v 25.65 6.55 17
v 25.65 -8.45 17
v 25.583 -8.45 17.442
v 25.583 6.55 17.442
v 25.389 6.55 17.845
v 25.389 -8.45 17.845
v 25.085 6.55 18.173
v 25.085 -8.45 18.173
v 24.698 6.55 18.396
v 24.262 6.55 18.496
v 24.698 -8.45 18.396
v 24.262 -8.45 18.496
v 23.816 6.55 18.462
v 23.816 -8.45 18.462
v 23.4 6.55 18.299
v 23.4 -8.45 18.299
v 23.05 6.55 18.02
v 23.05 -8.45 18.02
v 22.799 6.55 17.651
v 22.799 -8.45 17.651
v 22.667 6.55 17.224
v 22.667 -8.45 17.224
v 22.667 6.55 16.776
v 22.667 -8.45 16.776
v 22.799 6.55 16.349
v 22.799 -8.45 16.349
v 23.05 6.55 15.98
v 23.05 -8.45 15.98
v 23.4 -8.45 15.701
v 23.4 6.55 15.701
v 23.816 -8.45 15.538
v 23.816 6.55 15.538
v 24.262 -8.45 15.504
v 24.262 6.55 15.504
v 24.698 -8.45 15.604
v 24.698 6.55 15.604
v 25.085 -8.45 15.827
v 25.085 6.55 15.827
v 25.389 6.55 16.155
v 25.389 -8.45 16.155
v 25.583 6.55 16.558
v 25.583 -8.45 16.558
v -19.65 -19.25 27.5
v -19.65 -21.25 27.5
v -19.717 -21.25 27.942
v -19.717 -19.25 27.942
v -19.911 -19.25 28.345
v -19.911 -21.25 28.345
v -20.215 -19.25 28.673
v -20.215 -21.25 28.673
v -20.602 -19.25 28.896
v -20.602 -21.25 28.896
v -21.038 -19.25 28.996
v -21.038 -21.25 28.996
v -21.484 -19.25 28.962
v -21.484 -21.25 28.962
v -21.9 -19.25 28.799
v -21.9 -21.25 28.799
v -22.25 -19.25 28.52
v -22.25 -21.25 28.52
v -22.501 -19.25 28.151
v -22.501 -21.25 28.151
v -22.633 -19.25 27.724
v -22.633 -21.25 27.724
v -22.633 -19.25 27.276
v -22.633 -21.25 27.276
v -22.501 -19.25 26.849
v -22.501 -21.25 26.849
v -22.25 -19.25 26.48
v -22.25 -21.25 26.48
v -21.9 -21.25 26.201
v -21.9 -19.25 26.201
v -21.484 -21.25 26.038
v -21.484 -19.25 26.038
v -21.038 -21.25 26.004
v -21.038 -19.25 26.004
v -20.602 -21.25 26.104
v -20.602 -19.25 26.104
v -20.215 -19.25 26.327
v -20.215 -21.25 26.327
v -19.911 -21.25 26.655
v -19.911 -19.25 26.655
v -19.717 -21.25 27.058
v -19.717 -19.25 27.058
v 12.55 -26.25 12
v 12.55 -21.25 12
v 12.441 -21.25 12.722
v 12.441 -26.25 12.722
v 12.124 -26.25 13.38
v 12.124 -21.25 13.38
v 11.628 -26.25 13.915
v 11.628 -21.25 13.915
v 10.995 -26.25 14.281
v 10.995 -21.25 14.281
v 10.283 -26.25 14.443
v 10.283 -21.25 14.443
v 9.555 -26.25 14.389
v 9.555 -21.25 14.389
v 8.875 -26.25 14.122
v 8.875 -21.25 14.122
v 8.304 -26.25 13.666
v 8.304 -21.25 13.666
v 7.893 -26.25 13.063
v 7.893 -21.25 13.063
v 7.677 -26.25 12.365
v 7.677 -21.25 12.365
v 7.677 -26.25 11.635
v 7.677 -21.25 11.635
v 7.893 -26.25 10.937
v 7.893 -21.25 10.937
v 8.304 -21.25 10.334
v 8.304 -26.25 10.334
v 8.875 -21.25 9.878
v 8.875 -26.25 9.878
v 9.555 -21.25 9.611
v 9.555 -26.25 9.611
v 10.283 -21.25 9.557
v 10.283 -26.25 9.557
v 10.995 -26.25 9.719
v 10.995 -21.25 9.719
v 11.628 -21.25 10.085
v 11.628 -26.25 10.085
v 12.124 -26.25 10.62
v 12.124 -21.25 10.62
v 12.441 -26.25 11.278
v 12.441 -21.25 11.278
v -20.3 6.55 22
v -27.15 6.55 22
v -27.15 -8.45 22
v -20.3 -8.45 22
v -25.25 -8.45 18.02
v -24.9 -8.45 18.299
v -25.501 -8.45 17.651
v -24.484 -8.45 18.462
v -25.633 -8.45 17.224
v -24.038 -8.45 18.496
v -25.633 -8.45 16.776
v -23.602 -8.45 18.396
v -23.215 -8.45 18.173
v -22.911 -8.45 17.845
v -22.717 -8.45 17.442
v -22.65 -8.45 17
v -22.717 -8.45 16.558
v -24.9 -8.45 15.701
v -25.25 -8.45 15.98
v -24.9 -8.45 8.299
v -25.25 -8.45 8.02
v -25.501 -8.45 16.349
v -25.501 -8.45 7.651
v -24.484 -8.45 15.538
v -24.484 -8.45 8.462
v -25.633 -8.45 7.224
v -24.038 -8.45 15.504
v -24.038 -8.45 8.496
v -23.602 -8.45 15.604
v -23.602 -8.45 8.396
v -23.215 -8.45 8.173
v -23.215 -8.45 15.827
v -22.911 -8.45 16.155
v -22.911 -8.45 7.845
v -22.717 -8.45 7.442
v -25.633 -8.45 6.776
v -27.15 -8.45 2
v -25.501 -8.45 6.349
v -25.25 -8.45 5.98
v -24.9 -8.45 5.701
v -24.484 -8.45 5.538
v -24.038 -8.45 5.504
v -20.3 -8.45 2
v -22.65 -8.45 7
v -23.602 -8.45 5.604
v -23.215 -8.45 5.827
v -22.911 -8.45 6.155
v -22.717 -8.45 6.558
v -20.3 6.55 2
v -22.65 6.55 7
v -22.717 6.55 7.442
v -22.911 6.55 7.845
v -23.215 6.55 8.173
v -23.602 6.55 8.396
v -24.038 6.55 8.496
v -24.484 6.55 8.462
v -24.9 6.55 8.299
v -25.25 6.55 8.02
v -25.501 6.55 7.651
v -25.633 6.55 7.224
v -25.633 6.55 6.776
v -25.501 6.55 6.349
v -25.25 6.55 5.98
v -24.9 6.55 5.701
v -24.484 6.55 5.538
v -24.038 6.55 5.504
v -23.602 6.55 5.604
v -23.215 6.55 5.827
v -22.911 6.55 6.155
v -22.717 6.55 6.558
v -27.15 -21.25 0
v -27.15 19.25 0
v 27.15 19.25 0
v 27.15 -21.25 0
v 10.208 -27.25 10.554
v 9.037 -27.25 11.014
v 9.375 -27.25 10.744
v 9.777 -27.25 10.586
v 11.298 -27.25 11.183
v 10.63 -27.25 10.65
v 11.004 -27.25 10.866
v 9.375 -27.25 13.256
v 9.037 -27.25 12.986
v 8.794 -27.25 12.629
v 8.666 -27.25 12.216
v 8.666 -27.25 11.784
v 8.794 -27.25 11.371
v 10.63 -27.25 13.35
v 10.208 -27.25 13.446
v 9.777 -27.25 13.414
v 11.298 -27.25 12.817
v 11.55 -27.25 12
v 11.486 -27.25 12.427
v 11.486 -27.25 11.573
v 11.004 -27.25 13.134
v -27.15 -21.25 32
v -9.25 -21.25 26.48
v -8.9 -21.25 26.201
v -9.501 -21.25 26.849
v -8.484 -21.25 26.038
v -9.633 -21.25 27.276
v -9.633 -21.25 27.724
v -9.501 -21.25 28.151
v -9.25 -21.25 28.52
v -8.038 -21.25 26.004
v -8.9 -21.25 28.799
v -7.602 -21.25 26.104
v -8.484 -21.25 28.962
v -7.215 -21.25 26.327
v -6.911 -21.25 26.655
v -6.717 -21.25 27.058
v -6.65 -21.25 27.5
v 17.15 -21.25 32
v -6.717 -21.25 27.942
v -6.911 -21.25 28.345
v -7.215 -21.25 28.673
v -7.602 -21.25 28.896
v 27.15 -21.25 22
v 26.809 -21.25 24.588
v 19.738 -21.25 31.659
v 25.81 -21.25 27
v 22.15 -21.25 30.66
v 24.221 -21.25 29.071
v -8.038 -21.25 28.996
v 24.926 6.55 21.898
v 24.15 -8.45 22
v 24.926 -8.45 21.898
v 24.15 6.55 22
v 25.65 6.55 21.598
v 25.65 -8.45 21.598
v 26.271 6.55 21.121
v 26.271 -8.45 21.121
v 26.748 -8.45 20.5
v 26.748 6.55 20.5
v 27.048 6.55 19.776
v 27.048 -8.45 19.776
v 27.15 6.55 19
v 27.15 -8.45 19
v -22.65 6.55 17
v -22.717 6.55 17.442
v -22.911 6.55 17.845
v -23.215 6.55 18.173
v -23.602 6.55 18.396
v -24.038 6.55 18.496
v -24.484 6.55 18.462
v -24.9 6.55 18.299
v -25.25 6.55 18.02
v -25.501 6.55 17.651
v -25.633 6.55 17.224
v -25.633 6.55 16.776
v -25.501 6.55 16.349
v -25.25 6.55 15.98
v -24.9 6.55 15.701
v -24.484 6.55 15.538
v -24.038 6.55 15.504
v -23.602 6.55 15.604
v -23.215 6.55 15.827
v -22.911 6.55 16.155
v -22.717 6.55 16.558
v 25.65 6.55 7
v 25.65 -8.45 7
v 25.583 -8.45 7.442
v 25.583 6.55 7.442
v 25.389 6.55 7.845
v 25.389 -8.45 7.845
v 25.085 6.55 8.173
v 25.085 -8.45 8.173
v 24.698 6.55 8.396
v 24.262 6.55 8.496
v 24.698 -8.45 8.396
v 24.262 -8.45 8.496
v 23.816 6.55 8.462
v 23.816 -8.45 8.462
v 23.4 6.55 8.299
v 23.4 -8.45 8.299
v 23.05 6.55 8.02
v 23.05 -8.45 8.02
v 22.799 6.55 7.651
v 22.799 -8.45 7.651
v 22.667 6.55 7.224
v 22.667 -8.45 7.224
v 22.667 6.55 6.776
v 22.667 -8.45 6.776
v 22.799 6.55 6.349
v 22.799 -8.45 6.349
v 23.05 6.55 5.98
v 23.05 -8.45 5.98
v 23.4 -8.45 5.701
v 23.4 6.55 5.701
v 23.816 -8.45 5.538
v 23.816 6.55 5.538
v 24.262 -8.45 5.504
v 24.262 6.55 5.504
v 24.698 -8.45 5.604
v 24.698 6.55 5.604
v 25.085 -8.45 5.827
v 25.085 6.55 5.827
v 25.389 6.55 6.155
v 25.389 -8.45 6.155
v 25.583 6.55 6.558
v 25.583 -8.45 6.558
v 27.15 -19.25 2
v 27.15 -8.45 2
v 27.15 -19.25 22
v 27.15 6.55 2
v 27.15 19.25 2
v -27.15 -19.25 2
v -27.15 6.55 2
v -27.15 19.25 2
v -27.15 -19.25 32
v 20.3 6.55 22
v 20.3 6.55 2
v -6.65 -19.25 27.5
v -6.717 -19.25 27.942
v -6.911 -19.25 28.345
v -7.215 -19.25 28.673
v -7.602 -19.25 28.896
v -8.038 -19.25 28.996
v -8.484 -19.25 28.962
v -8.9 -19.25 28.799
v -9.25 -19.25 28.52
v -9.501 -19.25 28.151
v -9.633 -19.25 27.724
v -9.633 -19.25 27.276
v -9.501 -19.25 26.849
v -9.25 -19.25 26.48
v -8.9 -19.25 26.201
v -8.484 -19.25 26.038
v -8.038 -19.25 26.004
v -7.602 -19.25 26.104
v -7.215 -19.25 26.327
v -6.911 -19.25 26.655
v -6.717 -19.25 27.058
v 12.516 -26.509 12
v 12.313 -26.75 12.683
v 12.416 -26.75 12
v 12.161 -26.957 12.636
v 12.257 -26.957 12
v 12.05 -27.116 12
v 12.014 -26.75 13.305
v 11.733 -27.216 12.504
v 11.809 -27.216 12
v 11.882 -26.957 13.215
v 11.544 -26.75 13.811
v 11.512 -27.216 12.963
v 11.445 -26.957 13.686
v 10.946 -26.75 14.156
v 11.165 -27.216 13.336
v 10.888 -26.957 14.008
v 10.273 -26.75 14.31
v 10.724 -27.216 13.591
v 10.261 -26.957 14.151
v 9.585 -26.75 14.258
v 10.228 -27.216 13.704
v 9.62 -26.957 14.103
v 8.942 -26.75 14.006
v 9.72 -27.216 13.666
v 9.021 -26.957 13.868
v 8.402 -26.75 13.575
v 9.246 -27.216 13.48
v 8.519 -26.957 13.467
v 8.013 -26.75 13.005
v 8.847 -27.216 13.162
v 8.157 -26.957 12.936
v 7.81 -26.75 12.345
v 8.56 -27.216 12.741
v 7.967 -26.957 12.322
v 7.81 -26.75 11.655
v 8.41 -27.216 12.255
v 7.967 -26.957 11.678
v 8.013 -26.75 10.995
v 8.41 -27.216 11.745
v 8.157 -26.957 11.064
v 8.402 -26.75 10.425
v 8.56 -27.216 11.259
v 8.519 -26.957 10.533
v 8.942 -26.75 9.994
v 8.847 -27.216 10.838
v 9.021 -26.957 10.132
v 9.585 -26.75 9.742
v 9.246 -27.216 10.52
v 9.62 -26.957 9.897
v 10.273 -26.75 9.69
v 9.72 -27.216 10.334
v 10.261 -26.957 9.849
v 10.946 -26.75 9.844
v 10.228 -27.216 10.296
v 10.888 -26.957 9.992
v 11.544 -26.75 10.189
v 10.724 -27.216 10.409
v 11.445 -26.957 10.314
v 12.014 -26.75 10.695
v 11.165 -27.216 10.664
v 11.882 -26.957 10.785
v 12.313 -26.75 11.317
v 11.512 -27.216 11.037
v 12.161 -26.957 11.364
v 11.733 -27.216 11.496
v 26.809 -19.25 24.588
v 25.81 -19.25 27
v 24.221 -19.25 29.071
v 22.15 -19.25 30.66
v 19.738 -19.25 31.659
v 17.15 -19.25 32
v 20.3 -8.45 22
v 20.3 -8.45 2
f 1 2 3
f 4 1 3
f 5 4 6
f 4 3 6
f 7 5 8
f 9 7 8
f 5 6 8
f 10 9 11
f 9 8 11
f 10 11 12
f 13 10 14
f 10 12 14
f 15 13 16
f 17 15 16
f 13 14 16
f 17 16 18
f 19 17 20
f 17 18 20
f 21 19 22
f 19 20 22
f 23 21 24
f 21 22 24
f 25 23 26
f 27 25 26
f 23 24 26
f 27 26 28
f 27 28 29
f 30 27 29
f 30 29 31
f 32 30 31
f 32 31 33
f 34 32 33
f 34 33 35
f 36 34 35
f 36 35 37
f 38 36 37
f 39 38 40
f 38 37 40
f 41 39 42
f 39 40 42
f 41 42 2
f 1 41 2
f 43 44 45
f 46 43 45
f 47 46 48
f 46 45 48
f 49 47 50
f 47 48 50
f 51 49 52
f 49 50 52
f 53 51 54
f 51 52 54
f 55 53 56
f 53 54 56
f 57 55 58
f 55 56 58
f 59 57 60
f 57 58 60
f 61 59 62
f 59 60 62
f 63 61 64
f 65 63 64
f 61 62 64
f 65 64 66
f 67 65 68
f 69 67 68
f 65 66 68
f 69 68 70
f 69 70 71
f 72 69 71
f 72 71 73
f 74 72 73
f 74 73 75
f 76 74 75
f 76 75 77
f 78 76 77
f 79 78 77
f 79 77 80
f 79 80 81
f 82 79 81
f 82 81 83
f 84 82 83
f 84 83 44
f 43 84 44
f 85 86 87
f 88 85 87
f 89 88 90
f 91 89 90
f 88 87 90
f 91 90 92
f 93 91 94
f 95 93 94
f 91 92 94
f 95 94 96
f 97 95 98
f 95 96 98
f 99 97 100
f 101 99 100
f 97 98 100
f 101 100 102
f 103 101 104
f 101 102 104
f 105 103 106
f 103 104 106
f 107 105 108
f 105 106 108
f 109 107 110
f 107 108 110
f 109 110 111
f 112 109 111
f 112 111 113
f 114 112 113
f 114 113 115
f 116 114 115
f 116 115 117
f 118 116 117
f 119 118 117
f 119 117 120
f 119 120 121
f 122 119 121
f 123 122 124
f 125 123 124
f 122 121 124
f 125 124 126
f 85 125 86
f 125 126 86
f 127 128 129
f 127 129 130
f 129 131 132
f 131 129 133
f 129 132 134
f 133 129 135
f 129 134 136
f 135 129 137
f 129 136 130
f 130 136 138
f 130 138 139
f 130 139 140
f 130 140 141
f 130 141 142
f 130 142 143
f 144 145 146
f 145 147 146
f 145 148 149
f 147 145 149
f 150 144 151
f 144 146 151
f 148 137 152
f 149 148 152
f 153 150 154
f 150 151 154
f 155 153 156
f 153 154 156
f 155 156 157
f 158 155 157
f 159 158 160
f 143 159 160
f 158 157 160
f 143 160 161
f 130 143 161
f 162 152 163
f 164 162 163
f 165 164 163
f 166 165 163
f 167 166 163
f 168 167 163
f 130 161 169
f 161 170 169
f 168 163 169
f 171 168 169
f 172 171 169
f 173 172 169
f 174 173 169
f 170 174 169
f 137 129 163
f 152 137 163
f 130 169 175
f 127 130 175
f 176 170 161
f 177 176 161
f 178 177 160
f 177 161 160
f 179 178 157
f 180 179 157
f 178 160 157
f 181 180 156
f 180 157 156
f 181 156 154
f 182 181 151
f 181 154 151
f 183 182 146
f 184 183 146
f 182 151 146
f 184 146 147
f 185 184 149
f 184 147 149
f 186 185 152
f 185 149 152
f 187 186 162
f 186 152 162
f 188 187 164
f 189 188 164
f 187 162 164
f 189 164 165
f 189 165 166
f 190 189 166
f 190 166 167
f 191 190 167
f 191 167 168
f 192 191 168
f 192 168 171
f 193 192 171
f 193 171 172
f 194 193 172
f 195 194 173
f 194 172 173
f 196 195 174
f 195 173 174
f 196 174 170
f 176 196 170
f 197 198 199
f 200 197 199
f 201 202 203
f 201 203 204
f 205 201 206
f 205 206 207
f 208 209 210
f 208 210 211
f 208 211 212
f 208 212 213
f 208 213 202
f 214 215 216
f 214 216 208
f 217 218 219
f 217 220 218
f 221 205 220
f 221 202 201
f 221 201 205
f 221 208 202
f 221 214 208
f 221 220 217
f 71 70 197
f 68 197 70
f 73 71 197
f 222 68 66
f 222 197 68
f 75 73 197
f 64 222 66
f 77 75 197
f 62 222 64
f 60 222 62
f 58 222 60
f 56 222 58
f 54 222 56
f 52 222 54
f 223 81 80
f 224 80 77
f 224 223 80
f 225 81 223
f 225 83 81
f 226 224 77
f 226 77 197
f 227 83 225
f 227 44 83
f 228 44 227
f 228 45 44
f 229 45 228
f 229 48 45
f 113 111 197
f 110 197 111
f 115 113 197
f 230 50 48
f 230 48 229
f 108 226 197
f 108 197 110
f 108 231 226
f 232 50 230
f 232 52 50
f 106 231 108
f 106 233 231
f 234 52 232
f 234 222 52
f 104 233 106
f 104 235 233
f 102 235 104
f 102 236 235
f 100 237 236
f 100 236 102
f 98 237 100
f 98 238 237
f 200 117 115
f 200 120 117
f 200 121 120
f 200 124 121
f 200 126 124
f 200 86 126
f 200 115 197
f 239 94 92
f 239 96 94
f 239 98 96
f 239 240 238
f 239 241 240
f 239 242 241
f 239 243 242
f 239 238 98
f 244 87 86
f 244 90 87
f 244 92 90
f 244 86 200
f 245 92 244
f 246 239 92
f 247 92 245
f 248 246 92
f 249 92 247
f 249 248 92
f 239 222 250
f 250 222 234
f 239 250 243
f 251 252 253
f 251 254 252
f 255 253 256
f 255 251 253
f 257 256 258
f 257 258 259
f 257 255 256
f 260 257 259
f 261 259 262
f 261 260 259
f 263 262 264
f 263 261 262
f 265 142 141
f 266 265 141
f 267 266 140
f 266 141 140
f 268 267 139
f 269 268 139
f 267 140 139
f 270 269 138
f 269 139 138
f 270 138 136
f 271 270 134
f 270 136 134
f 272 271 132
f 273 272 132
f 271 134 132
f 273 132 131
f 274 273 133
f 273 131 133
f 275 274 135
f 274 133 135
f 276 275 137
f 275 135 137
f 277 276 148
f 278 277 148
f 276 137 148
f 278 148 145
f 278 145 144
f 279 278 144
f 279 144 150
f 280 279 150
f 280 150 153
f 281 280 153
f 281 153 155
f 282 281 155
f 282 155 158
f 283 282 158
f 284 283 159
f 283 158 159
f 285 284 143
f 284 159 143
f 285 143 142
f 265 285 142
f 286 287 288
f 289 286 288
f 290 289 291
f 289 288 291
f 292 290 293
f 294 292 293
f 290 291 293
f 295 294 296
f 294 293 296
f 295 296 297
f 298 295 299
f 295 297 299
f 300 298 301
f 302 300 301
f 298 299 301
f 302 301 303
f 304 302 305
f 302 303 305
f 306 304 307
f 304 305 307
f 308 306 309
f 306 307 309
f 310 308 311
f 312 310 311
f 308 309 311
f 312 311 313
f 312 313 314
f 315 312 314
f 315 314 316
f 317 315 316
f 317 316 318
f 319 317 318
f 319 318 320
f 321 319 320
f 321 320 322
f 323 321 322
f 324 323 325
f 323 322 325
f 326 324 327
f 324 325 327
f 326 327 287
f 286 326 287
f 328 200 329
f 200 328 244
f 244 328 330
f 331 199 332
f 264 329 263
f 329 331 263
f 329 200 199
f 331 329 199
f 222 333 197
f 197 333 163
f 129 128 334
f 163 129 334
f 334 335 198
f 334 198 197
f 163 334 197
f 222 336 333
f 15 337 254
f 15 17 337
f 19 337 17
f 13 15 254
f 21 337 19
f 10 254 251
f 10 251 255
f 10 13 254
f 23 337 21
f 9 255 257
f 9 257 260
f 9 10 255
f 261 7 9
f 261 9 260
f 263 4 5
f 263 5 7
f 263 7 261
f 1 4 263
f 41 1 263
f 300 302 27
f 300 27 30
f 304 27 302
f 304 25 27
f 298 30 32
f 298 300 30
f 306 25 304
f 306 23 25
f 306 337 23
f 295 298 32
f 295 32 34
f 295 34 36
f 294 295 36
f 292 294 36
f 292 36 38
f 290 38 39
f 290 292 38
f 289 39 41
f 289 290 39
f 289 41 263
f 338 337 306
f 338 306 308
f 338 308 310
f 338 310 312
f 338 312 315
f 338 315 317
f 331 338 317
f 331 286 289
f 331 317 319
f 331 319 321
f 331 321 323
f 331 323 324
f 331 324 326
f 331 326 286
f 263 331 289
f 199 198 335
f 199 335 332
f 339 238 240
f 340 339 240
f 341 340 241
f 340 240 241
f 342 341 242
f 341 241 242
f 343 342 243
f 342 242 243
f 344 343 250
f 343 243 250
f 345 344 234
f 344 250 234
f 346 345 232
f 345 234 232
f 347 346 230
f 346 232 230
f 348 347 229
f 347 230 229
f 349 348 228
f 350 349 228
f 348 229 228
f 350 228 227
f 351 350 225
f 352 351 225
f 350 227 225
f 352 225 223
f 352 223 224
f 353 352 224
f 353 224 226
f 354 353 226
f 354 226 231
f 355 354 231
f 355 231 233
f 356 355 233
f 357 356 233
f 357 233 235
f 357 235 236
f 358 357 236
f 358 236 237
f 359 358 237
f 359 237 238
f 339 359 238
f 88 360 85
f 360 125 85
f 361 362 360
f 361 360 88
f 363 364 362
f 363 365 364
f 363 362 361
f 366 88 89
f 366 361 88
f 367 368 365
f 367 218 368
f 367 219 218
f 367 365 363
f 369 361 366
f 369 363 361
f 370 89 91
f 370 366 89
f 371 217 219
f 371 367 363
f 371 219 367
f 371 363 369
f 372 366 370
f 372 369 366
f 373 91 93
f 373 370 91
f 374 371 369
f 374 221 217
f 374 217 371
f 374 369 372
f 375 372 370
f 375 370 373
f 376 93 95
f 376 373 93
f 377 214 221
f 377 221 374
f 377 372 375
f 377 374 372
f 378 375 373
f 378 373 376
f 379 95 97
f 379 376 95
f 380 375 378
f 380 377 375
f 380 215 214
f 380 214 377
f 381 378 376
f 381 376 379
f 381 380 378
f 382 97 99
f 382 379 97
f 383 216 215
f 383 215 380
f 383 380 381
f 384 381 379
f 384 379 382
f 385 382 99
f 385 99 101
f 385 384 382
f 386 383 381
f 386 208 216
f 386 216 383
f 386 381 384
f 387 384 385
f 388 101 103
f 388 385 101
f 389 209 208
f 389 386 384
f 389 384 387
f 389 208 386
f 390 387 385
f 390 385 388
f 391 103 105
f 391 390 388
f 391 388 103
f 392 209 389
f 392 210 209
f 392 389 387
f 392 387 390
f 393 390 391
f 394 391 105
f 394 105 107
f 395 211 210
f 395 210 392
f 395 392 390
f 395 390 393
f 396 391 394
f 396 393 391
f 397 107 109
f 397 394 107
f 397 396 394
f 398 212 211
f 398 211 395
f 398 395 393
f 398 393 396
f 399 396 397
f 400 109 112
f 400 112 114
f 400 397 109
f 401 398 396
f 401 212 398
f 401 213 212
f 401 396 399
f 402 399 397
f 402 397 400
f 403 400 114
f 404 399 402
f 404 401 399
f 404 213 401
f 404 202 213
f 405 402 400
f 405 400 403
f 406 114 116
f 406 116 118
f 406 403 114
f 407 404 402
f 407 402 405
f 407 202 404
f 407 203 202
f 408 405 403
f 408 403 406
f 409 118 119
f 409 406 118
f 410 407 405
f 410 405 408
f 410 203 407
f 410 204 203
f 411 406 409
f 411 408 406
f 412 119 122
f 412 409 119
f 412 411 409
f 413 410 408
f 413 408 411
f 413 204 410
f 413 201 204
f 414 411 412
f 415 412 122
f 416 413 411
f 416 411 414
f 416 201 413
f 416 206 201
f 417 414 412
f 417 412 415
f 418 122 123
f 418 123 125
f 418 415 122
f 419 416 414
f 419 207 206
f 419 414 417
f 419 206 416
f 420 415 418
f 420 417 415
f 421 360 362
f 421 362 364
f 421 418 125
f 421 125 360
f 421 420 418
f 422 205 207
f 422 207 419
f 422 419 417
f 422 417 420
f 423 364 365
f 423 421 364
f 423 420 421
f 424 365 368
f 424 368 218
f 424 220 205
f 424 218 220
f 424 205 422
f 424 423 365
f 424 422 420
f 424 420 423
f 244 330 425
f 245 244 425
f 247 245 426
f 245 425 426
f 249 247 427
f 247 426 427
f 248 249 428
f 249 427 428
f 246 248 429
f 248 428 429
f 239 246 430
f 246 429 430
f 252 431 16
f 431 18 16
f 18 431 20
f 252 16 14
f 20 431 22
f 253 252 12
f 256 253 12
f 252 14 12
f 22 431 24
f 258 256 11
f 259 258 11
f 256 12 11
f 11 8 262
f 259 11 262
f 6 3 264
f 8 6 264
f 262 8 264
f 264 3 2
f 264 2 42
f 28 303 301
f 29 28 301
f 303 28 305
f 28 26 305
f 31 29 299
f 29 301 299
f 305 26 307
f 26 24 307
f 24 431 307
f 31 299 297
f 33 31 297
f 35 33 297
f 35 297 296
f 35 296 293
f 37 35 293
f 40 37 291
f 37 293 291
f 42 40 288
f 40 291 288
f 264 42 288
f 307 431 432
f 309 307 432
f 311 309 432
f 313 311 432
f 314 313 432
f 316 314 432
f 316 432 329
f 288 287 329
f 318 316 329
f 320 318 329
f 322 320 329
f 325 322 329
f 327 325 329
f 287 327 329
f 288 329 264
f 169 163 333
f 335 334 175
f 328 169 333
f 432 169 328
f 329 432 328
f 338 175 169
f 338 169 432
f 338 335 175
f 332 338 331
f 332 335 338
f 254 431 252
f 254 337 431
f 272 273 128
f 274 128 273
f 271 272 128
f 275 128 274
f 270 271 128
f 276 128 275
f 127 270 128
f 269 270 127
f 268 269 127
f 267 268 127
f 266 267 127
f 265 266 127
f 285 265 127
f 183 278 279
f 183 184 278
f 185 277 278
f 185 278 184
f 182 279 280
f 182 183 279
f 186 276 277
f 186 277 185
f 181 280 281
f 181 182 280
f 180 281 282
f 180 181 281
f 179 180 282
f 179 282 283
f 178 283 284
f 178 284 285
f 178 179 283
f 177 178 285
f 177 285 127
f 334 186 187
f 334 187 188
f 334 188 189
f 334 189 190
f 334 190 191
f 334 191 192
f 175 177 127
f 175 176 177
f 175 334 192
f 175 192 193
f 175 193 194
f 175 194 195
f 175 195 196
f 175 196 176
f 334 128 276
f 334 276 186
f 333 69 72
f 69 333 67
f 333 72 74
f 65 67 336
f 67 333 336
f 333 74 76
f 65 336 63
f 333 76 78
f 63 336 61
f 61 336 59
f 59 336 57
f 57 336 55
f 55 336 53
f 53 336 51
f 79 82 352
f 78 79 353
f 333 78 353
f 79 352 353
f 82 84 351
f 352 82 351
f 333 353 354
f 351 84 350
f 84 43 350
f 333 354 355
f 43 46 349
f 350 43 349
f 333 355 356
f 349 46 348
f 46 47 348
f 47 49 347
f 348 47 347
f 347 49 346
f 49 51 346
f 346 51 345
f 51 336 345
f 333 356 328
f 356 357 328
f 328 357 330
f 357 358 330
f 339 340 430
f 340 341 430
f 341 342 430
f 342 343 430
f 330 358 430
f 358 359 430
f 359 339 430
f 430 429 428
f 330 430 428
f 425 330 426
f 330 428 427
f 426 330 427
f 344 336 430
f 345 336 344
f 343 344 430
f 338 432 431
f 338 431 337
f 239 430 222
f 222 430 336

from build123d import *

# Parameters (mm, degrees)
SKETCH_W        = 54.3
SKETCH_H        = 38.5
PAD_DEPTH       = 2
SKETCH001_W     = 6.85
SKETCH001_H     = 15
PAD001_DEPTH    = 20
SKETCH002_R     = 1.5
POCKET_DEPTH    = 15
PAD002_DEPTH    = 2
FILLET_R        = 3
SKETCH004_R     = 2.45
PAD003_DEPTH    = 6
FILLET001_R     = 1
SKETCH005_R     = 1.5
POCKET001_DEPTH = 5


with BuildPart() as part:
    # Sketch → Pad (new body)
    with BuildSketch(Plane.XY):
        Rectangle(SKETCH_W, SKETCH_H)
    extrude(amount=PAD_DEPTH)

    # Sketch001 (on Face6 of Pad) → Pad001 (join)
    with BuildSketch(Plane.XY.offset(2)):
        with Locations((23.725, -0.95)):
            Rectangle(SKETCH001_W, SKETCH001_H)
        with Locations((-23.725, -0.95)):
            Rectangle(SKETCH001_W, SKETCH001_H)
    extrude(amount=PAD001_DEPTH)

    # Sketch002 (on Face11 of Pad001) → Pocket (cut)
    with BuildSketch(Plane.XZ.offset(8.45)):
        with Locations((24.15, 17)):
            Circle(SKETCH002_R)
        with Locations((24.15, 7)):
            Circle(SKETCH002_R)
        with Locations((-24.15, 17)):
            Circle(SKETCH002_R)
        with Locations((-24.15, 7)):
            Circle(SKETCH002_R)
    extrude(amount=-POCKET_DEPTH, mode=Mode.SUBTRACT)

    # Sketch003 (on Face6 of Pocket) → Pad002 (join)
    with BuildSketch(Plane.XZ.offset(19.25)):
        with BuildLine():
            Line((-27.15, 0), (27.15, 0))
            Line((27.15, 0), (27.15, 22))
            ThreePointArc((27.15, 22), (24.221068, 29.071068), (17.15, 32))
            Line((17.15, 32), (-27.15, 32))
            Line((-27.15, 32), (-27.15, 0))
        make_face()
    extrude(amount=PAD002_DEPTH)

    # Fillet
    fillet_edges = [part.edges().sort_by_distance(p)[0] for p in [
        (27.15, -0.95, 22),
    ]]
    fillet(fillet_edges, radius=FILLET_R)

    # Sketch004 (on Face21 of Fillet) → Pad003 (join)
    with BuildSketch(Plane.XZ.offset(21.25)):
        with Locations((10.1, 12)):
            Circle(SKETCH004_R)
    extrude(amount=PAD003_DEPTH)

    # Fillet001
    fillet001_edges = [part.edges().sort_by_distance(p)[0] for p in [
        (7.65, -27.25, 12),
    ]]
    fillet(fillet001_edges, radius=FILLET001_R)

    # Sketch005 (on Face3 of Fillet001) → Pocket001 (cut)
    with BuildSketch(Plane.XZ.offset(21.25)):
        with Locations((-21.15, 27.5)):
            Circle(SKETCH005_R)
        with Locations((-8.15, 27.5)):
            Circle(SKETCH005_R)
    extrude(amount=-POCKET001_DEPTH, mode=Mode.SUBTRACT)


solid = part.part
